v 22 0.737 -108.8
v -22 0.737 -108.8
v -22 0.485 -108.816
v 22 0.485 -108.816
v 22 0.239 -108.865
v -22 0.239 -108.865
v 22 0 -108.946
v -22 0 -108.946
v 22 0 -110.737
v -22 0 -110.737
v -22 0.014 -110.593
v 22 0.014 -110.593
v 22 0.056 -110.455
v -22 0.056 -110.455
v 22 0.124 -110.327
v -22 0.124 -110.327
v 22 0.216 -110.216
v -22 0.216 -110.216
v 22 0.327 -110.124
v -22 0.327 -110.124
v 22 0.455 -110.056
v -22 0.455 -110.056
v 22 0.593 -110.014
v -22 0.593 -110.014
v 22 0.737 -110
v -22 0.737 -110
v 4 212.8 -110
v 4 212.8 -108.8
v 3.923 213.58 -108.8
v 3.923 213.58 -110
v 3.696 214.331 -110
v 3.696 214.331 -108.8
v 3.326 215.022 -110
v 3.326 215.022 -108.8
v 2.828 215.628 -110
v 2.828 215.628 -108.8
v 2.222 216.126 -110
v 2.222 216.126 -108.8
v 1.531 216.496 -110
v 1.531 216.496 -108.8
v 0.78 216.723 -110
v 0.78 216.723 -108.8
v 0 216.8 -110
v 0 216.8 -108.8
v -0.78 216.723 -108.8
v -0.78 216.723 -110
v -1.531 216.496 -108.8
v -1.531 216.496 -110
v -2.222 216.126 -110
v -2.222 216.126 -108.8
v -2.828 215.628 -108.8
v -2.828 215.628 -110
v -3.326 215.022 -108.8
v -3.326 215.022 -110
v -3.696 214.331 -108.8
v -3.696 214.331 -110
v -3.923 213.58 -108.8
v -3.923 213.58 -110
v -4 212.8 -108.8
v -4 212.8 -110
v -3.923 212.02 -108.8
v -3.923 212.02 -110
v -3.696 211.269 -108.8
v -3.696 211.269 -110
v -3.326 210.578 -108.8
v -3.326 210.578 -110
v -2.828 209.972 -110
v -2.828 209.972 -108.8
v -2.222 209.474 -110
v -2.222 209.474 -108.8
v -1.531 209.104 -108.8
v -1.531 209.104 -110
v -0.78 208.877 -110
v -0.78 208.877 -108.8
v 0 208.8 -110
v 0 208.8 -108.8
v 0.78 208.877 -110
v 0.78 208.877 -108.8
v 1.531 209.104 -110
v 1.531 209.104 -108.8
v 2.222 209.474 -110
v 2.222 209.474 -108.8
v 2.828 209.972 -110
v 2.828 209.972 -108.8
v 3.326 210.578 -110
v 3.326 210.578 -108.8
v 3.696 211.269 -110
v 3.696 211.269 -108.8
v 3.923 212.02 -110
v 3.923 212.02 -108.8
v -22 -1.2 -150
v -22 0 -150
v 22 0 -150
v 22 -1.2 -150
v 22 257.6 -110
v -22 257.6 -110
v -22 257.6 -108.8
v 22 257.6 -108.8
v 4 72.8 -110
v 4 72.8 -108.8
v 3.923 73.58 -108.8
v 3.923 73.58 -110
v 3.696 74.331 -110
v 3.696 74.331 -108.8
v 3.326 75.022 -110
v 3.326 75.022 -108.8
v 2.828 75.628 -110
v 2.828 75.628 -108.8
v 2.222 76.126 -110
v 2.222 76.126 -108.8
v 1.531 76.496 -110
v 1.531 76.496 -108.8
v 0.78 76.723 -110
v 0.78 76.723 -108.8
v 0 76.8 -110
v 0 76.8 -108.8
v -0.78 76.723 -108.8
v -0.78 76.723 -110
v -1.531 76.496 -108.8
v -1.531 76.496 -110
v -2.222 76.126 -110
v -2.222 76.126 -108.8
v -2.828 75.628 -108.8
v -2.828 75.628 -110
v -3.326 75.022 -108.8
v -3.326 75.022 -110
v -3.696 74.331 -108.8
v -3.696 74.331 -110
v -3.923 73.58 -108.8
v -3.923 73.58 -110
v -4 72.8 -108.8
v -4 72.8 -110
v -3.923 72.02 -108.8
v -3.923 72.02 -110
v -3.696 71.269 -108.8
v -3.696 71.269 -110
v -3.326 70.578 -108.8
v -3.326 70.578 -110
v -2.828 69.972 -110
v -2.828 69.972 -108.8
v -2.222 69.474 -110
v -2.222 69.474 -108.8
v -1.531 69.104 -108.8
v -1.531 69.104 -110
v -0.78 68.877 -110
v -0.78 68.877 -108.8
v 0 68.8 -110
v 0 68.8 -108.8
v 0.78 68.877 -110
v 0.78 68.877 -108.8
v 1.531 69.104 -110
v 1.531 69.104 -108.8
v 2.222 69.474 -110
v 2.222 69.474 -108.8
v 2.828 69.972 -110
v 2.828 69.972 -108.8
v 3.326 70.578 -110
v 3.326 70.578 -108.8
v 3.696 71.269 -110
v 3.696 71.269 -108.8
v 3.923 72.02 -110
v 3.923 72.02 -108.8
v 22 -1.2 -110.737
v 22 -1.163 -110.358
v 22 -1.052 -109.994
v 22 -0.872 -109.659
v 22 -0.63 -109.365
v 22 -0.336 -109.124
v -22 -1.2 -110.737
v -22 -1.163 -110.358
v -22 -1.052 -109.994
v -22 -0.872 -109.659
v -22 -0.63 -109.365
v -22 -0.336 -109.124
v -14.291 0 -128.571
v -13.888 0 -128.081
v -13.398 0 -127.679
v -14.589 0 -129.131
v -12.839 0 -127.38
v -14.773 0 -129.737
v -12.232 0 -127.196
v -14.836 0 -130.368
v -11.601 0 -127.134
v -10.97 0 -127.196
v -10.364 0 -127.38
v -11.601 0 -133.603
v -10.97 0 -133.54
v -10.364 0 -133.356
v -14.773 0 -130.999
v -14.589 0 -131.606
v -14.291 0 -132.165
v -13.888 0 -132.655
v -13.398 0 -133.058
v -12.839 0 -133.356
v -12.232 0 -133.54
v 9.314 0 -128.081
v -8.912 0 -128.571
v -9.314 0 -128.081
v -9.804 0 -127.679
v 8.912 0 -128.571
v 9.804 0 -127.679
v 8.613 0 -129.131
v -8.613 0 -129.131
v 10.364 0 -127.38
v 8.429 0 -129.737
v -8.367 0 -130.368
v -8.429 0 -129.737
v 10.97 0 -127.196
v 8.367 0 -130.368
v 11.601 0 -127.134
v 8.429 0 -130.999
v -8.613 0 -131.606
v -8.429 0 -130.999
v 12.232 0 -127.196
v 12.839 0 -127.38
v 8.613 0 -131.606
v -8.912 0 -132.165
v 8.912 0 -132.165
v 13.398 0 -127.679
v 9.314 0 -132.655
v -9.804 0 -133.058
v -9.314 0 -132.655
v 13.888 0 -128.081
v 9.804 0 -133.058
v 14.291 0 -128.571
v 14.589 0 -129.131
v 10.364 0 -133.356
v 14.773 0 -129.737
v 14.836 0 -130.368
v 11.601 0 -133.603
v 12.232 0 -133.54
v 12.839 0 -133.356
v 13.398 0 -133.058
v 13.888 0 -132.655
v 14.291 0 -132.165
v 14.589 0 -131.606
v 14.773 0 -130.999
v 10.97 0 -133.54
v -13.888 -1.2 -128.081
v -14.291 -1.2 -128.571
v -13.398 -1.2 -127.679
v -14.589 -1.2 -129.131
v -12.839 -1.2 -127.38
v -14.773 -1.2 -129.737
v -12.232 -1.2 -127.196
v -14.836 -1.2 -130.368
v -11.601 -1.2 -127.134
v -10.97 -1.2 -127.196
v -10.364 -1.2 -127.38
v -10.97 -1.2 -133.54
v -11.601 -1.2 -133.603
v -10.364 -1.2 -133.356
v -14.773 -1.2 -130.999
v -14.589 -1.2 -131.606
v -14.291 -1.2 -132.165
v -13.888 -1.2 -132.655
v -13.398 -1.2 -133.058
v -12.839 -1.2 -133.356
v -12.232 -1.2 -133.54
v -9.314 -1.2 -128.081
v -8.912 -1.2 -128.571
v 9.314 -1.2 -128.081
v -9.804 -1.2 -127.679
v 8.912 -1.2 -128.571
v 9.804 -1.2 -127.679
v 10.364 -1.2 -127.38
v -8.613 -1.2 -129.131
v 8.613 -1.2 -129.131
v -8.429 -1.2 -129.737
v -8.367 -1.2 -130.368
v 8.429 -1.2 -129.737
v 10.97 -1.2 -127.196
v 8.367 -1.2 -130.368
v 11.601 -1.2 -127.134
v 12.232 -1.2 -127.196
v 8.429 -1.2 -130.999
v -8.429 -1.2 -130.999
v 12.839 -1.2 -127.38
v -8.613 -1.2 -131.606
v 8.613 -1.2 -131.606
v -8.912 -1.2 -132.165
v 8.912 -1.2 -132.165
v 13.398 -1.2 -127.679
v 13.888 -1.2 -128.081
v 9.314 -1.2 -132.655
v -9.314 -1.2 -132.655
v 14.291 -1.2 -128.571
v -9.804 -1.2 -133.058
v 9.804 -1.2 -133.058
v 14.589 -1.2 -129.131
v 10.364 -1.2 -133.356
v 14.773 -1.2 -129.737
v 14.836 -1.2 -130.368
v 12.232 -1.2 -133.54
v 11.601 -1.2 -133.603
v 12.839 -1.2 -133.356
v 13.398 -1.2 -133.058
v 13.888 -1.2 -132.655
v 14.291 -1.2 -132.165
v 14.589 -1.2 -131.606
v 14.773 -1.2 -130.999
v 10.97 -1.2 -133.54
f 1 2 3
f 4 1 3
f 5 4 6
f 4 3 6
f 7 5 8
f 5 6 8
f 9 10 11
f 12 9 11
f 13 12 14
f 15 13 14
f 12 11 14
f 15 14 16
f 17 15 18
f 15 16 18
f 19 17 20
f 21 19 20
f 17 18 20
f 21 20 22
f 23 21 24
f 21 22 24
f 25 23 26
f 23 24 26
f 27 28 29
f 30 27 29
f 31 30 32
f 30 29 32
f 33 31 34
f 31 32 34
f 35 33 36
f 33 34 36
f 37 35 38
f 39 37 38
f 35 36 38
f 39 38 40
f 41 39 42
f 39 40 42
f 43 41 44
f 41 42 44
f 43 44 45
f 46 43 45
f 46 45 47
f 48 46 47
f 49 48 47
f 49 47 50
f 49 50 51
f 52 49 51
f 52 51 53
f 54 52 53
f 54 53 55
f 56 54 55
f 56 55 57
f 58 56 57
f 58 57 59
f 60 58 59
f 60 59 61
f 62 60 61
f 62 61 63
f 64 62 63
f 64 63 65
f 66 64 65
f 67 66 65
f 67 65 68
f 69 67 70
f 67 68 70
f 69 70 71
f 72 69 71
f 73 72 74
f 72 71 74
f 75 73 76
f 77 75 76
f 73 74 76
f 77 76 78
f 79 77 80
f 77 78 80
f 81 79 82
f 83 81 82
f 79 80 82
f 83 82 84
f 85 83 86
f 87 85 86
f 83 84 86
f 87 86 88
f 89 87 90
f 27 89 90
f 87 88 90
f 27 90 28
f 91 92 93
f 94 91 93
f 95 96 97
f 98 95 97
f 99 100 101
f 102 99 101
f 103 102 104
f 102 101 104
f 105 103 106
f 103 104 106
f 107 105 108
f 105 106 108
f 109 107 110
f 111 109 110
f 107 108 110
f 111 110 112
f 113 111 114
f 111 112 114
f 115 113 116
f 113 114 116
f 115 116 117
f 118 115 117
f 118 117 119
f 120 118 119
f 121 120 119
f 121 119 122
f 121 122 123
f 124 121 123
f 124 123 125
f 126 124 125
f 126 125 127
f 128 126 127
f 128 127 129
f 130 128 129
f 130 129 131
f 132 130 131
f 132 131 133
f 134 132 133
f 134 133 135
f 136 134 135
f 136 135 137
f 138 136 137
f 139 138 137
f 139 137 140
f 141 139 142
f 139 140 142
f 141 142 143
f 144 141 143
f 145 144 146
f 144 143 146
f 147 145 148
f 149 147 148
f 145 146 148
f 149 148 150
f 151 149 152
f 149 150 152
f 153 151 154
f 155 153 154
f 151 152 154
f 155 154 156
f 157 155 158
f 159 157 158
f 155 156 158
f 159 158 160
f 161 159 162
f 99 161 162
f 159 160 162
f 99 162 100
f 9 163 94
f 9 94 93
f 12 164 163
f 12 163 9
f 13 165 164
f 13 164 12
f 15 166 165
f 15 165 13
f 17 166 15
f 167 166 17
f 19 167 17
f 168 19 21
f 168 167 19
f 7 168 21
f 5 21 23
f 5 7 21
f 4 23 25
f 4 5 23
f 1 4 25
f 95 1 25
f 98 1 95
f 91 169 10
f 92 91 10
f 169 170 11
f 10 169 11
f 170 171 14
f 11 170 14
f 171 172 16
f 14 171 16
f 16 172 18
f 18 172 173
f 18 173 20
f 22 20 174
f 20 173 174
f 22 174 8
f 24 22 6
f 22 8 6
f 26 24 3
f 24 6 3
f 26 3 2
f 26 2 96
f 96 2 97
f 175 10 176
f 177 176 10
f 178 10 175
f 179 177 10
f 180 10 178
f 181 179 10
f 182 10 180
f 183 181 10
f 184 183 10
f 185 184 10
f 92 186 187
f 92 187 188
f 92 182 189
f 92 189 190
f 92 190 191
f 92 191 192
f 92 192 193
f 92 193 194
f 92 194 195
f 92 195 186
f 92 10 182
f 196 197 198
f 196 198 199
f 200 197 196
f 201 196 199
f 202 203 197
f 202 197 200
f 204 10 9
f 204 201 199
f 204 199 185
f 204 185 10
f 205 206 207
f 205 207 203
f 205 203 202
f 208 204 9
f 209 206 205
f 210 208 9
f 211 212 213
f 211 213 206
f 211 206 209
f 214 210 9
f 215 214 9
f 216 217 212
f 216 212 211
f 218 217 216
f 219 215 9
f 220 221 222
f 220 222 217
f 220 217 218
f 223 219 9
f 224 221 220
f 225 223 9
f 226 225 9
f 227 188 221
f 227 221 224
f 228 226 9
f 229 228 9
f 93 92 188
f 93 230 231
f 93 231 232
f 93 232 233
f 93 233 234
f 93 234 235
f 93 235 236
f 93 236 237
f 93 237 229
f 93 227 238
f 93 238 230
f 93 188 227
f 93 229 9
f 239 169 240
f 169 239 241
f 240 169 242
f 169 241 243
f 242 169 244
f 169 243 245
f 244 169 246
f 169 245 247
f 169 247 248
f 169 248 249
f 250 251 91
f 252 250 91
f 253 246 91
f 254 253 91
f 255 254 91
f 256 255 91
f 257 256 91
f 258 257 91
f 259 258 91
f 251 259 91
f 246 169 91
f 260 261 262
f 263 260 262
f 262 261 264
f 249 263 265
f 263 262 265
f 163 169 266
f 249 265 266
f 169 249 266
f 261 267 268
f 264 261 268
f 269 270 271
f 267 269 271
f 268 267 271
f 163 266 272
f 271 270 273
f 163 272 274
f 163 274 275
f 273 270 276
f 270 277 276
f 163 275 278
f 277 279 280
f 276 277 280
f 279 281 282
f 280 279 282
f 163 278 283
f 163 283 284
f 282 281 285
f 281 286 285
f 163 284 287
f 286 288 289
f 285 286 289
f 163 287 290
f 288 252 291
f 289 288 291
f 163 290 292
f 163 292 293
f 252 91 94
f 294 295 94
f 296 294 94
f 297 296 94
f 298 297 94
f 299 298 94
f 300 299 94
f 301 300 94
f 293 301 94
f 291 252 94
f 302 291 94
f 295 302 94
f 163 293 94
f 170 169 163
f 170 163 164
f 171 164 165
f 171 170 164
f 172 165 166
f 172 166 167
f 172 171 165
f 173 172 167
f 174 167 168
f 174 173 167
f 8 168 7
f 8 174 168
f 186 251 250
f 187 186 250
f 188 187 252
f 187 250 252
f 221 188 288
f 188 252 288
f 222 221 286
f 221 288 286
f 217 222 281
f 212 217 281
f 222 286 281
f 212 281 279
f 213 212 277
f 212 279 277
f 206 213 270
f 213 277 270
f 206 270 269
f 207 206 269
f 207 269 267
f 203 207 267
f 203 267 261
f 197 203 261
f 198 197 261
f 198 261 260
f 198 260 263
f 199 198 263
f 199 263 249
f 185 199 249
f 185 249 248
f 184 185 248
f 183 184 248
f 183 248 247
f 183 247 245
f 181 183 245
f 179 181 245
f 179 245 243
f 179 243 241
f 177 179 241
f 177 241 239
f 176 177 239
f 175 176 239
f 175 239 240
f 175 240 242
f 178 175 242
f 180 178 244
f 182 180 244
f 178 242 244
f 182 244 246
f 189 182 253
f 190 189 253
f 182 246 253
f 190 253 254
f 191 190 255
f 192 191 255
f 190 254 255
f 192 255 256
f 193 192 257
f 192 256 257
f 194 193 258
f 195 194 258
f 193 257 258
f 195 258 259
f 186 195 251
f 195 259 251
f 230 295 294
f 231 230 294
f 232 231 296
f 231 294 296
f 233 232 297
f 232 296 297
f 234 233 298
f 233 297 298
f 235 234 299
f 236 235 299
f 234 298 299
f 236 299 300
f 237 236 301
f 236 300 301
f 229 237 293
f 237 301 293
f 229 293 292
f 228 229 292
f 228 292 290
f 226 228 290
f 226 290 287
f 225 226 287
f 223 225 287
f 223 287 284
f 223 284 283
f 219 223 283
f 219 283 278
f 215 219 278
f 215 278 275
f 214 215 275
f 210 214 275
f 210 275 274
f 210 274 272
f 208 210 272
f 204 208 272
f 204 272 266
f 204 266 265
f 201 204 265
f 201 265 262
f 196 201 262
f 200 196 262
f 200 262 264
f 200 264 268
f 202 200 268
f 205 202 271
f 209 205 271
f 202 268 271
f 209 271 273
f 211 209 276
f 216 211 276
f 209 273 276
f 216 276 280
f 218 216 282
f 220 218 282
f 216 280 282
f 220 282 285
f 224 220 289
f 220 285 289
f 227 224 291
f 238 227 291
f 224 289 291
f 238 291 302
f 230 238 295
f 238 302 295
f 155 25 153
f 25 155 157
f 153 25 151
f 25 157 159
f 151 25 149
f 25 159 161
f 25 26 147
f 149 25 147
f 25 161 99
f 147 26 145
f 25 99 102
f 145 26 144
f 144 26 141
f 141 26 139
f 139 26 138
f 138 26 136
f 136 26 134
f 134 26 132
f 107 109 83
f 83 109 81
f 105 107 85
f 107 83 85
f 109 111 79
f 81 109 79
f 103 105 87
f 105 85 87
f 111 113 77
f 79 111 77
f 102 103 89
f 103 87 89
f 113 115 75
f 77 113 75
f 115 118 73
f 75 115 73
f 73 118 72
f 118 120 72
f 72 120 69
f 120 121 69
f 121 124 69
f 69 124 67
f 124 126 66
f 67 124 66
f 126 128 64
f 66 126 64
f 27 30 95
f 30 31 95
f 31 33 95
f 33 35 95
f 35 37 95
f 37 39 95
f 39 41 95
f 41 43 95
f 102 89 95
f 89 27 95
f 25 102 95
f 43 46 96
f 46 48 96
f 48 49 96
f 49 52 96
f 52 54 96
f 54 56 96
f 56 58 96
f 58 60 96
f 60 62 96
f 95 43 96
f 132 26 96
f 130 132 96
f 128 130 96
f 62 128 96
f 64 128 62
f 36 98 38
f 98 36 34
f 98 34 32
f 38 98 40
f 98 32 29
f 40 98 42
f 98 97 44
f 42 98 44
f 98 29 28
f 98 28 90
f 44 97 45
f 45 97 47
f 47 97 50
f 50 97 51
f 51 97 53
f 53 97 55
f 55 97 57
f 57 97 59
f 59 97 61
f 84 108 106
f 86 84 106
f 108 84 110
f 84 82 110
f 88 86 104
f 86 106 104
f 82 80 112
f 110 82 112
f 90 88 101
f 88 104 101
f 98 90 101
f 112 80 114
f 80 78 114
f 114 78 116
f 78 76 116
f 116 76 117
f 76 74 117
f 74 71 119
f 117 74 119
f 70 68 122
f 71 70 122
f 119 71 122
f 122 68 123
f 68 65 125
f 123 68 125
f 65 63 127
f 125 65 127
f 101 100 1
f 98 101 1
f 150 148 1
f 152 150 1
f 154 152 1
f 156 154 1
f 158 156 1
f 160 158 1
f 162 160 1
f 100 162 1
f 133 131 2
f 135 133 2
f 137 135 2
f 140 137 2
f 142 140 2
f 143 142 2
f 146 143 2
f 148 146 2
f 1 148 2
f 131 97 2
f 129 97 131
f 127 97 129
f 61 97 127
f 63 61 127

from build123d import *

# Parameters (mm, degrees)
SKETCH1_W              = 44
SKETCH1_H              = 300
BASE_FLANGE1_DEPTH     = 1.2
SKETCHED_START         = -22
SKETCHED_BEND1_DEPTH   = 44
SKETCHED_BEND1_2_DEPTH = 44
SKETCH7_R              = 4
CUT_EXTRUDE1_DEPTH     = 10
SKETCH9_R              = 3.234304459
CUT_EXTRUDE2_DEPTH     = 10


# Read off the part's stored shape, not the designer's step: Sketched Bend1
# Sheet-metal steps are written as plain solids
with BuildPart() as part:
    # Sketch1 → Base-Flange1 (new body)
    with BuildSketch(Plane(origin=(0, 0, 0), x_dir=(1, 0, 0), z_dir=(0, 1, 0))):
        Rectangle(SKETCH1_W, SKETCH1_H)
    extrude(amount=-BASE_FLANGE1_DEPTH)

    # Sketched Bend1 outline → Sketched Bend1 (cut)
    with BuildSketch(Plane.YZ.offset(SKETCHED_START)):
        with BuildLine():
            ThreePointArc((-1.2, -110.7366), (-0.872269031, -109.658657516), (0, -108.945555612))
            Line((0, -108.945555612), (0, 150))
            Line((0, 150), (-1.2, 150))
            Line((-1.2, 150), (-1.2, -110.7366))
        make_face()
    extrude(amount=SKETCHED_BEND1_DEPTH, mode=Mode.SUBTRACT)

    # Sketched Bend1 2 outline → Sketched Bend1 2 (add)
    with BuildSketch(Plane.YZ.offset(SKETCHED_START)):
        with BuildLine():
            Line((257.6, -110), (257.6, -108.8))
            Line((257.6, -108.8), (0.7366, -108.8))
            ThreePointArc((0.7366, -108.8), (0.361178238, -108.836737358), (0, -108.945555612))
            Line((0, -108.945555612), (0, -110.7366))
            ThreePointArc((0, -110.7366), (0.215745145, -110.215745145), (0.7366, -110))
            Line((0.7366, -110), (257.6, -110))
        make_face()
    extrude(amount=SKETCHED_BEND1_2_DEPTH)

    # Sketch7 → Cut-Extrude1 (cut)
    with BuildSketch(Plane.XY.offset(-108.8)):
        with Locations((0, 72.8)):
            Circle(SKETCH7_R)
        with Locations((0, 212.8)):
            Circle(SKETCH7_R)
    extrude(amount=-CUT_EXTRUDE1_DEPTH, mode=Mode.SUBTRACT)

    # Sketch9 → Cut-Extrude2 (cut)
    with BuildSketch(Plane.XZ.offset(1.2)):
        with Locations(Location((-11.601340887, -130.3683, 0), (0, 0, 270))):
            Circle(SKETCH9_R)
        with Locations(Location((11.601340887, -130.3683, 0), (0, 0, 270))):
            Circle(SKETCH9_R)
    extrude(amount=-CUT_EXTRUDE2_DEPTH, mode=Mode.SUBTRACT)


solid = part.part
